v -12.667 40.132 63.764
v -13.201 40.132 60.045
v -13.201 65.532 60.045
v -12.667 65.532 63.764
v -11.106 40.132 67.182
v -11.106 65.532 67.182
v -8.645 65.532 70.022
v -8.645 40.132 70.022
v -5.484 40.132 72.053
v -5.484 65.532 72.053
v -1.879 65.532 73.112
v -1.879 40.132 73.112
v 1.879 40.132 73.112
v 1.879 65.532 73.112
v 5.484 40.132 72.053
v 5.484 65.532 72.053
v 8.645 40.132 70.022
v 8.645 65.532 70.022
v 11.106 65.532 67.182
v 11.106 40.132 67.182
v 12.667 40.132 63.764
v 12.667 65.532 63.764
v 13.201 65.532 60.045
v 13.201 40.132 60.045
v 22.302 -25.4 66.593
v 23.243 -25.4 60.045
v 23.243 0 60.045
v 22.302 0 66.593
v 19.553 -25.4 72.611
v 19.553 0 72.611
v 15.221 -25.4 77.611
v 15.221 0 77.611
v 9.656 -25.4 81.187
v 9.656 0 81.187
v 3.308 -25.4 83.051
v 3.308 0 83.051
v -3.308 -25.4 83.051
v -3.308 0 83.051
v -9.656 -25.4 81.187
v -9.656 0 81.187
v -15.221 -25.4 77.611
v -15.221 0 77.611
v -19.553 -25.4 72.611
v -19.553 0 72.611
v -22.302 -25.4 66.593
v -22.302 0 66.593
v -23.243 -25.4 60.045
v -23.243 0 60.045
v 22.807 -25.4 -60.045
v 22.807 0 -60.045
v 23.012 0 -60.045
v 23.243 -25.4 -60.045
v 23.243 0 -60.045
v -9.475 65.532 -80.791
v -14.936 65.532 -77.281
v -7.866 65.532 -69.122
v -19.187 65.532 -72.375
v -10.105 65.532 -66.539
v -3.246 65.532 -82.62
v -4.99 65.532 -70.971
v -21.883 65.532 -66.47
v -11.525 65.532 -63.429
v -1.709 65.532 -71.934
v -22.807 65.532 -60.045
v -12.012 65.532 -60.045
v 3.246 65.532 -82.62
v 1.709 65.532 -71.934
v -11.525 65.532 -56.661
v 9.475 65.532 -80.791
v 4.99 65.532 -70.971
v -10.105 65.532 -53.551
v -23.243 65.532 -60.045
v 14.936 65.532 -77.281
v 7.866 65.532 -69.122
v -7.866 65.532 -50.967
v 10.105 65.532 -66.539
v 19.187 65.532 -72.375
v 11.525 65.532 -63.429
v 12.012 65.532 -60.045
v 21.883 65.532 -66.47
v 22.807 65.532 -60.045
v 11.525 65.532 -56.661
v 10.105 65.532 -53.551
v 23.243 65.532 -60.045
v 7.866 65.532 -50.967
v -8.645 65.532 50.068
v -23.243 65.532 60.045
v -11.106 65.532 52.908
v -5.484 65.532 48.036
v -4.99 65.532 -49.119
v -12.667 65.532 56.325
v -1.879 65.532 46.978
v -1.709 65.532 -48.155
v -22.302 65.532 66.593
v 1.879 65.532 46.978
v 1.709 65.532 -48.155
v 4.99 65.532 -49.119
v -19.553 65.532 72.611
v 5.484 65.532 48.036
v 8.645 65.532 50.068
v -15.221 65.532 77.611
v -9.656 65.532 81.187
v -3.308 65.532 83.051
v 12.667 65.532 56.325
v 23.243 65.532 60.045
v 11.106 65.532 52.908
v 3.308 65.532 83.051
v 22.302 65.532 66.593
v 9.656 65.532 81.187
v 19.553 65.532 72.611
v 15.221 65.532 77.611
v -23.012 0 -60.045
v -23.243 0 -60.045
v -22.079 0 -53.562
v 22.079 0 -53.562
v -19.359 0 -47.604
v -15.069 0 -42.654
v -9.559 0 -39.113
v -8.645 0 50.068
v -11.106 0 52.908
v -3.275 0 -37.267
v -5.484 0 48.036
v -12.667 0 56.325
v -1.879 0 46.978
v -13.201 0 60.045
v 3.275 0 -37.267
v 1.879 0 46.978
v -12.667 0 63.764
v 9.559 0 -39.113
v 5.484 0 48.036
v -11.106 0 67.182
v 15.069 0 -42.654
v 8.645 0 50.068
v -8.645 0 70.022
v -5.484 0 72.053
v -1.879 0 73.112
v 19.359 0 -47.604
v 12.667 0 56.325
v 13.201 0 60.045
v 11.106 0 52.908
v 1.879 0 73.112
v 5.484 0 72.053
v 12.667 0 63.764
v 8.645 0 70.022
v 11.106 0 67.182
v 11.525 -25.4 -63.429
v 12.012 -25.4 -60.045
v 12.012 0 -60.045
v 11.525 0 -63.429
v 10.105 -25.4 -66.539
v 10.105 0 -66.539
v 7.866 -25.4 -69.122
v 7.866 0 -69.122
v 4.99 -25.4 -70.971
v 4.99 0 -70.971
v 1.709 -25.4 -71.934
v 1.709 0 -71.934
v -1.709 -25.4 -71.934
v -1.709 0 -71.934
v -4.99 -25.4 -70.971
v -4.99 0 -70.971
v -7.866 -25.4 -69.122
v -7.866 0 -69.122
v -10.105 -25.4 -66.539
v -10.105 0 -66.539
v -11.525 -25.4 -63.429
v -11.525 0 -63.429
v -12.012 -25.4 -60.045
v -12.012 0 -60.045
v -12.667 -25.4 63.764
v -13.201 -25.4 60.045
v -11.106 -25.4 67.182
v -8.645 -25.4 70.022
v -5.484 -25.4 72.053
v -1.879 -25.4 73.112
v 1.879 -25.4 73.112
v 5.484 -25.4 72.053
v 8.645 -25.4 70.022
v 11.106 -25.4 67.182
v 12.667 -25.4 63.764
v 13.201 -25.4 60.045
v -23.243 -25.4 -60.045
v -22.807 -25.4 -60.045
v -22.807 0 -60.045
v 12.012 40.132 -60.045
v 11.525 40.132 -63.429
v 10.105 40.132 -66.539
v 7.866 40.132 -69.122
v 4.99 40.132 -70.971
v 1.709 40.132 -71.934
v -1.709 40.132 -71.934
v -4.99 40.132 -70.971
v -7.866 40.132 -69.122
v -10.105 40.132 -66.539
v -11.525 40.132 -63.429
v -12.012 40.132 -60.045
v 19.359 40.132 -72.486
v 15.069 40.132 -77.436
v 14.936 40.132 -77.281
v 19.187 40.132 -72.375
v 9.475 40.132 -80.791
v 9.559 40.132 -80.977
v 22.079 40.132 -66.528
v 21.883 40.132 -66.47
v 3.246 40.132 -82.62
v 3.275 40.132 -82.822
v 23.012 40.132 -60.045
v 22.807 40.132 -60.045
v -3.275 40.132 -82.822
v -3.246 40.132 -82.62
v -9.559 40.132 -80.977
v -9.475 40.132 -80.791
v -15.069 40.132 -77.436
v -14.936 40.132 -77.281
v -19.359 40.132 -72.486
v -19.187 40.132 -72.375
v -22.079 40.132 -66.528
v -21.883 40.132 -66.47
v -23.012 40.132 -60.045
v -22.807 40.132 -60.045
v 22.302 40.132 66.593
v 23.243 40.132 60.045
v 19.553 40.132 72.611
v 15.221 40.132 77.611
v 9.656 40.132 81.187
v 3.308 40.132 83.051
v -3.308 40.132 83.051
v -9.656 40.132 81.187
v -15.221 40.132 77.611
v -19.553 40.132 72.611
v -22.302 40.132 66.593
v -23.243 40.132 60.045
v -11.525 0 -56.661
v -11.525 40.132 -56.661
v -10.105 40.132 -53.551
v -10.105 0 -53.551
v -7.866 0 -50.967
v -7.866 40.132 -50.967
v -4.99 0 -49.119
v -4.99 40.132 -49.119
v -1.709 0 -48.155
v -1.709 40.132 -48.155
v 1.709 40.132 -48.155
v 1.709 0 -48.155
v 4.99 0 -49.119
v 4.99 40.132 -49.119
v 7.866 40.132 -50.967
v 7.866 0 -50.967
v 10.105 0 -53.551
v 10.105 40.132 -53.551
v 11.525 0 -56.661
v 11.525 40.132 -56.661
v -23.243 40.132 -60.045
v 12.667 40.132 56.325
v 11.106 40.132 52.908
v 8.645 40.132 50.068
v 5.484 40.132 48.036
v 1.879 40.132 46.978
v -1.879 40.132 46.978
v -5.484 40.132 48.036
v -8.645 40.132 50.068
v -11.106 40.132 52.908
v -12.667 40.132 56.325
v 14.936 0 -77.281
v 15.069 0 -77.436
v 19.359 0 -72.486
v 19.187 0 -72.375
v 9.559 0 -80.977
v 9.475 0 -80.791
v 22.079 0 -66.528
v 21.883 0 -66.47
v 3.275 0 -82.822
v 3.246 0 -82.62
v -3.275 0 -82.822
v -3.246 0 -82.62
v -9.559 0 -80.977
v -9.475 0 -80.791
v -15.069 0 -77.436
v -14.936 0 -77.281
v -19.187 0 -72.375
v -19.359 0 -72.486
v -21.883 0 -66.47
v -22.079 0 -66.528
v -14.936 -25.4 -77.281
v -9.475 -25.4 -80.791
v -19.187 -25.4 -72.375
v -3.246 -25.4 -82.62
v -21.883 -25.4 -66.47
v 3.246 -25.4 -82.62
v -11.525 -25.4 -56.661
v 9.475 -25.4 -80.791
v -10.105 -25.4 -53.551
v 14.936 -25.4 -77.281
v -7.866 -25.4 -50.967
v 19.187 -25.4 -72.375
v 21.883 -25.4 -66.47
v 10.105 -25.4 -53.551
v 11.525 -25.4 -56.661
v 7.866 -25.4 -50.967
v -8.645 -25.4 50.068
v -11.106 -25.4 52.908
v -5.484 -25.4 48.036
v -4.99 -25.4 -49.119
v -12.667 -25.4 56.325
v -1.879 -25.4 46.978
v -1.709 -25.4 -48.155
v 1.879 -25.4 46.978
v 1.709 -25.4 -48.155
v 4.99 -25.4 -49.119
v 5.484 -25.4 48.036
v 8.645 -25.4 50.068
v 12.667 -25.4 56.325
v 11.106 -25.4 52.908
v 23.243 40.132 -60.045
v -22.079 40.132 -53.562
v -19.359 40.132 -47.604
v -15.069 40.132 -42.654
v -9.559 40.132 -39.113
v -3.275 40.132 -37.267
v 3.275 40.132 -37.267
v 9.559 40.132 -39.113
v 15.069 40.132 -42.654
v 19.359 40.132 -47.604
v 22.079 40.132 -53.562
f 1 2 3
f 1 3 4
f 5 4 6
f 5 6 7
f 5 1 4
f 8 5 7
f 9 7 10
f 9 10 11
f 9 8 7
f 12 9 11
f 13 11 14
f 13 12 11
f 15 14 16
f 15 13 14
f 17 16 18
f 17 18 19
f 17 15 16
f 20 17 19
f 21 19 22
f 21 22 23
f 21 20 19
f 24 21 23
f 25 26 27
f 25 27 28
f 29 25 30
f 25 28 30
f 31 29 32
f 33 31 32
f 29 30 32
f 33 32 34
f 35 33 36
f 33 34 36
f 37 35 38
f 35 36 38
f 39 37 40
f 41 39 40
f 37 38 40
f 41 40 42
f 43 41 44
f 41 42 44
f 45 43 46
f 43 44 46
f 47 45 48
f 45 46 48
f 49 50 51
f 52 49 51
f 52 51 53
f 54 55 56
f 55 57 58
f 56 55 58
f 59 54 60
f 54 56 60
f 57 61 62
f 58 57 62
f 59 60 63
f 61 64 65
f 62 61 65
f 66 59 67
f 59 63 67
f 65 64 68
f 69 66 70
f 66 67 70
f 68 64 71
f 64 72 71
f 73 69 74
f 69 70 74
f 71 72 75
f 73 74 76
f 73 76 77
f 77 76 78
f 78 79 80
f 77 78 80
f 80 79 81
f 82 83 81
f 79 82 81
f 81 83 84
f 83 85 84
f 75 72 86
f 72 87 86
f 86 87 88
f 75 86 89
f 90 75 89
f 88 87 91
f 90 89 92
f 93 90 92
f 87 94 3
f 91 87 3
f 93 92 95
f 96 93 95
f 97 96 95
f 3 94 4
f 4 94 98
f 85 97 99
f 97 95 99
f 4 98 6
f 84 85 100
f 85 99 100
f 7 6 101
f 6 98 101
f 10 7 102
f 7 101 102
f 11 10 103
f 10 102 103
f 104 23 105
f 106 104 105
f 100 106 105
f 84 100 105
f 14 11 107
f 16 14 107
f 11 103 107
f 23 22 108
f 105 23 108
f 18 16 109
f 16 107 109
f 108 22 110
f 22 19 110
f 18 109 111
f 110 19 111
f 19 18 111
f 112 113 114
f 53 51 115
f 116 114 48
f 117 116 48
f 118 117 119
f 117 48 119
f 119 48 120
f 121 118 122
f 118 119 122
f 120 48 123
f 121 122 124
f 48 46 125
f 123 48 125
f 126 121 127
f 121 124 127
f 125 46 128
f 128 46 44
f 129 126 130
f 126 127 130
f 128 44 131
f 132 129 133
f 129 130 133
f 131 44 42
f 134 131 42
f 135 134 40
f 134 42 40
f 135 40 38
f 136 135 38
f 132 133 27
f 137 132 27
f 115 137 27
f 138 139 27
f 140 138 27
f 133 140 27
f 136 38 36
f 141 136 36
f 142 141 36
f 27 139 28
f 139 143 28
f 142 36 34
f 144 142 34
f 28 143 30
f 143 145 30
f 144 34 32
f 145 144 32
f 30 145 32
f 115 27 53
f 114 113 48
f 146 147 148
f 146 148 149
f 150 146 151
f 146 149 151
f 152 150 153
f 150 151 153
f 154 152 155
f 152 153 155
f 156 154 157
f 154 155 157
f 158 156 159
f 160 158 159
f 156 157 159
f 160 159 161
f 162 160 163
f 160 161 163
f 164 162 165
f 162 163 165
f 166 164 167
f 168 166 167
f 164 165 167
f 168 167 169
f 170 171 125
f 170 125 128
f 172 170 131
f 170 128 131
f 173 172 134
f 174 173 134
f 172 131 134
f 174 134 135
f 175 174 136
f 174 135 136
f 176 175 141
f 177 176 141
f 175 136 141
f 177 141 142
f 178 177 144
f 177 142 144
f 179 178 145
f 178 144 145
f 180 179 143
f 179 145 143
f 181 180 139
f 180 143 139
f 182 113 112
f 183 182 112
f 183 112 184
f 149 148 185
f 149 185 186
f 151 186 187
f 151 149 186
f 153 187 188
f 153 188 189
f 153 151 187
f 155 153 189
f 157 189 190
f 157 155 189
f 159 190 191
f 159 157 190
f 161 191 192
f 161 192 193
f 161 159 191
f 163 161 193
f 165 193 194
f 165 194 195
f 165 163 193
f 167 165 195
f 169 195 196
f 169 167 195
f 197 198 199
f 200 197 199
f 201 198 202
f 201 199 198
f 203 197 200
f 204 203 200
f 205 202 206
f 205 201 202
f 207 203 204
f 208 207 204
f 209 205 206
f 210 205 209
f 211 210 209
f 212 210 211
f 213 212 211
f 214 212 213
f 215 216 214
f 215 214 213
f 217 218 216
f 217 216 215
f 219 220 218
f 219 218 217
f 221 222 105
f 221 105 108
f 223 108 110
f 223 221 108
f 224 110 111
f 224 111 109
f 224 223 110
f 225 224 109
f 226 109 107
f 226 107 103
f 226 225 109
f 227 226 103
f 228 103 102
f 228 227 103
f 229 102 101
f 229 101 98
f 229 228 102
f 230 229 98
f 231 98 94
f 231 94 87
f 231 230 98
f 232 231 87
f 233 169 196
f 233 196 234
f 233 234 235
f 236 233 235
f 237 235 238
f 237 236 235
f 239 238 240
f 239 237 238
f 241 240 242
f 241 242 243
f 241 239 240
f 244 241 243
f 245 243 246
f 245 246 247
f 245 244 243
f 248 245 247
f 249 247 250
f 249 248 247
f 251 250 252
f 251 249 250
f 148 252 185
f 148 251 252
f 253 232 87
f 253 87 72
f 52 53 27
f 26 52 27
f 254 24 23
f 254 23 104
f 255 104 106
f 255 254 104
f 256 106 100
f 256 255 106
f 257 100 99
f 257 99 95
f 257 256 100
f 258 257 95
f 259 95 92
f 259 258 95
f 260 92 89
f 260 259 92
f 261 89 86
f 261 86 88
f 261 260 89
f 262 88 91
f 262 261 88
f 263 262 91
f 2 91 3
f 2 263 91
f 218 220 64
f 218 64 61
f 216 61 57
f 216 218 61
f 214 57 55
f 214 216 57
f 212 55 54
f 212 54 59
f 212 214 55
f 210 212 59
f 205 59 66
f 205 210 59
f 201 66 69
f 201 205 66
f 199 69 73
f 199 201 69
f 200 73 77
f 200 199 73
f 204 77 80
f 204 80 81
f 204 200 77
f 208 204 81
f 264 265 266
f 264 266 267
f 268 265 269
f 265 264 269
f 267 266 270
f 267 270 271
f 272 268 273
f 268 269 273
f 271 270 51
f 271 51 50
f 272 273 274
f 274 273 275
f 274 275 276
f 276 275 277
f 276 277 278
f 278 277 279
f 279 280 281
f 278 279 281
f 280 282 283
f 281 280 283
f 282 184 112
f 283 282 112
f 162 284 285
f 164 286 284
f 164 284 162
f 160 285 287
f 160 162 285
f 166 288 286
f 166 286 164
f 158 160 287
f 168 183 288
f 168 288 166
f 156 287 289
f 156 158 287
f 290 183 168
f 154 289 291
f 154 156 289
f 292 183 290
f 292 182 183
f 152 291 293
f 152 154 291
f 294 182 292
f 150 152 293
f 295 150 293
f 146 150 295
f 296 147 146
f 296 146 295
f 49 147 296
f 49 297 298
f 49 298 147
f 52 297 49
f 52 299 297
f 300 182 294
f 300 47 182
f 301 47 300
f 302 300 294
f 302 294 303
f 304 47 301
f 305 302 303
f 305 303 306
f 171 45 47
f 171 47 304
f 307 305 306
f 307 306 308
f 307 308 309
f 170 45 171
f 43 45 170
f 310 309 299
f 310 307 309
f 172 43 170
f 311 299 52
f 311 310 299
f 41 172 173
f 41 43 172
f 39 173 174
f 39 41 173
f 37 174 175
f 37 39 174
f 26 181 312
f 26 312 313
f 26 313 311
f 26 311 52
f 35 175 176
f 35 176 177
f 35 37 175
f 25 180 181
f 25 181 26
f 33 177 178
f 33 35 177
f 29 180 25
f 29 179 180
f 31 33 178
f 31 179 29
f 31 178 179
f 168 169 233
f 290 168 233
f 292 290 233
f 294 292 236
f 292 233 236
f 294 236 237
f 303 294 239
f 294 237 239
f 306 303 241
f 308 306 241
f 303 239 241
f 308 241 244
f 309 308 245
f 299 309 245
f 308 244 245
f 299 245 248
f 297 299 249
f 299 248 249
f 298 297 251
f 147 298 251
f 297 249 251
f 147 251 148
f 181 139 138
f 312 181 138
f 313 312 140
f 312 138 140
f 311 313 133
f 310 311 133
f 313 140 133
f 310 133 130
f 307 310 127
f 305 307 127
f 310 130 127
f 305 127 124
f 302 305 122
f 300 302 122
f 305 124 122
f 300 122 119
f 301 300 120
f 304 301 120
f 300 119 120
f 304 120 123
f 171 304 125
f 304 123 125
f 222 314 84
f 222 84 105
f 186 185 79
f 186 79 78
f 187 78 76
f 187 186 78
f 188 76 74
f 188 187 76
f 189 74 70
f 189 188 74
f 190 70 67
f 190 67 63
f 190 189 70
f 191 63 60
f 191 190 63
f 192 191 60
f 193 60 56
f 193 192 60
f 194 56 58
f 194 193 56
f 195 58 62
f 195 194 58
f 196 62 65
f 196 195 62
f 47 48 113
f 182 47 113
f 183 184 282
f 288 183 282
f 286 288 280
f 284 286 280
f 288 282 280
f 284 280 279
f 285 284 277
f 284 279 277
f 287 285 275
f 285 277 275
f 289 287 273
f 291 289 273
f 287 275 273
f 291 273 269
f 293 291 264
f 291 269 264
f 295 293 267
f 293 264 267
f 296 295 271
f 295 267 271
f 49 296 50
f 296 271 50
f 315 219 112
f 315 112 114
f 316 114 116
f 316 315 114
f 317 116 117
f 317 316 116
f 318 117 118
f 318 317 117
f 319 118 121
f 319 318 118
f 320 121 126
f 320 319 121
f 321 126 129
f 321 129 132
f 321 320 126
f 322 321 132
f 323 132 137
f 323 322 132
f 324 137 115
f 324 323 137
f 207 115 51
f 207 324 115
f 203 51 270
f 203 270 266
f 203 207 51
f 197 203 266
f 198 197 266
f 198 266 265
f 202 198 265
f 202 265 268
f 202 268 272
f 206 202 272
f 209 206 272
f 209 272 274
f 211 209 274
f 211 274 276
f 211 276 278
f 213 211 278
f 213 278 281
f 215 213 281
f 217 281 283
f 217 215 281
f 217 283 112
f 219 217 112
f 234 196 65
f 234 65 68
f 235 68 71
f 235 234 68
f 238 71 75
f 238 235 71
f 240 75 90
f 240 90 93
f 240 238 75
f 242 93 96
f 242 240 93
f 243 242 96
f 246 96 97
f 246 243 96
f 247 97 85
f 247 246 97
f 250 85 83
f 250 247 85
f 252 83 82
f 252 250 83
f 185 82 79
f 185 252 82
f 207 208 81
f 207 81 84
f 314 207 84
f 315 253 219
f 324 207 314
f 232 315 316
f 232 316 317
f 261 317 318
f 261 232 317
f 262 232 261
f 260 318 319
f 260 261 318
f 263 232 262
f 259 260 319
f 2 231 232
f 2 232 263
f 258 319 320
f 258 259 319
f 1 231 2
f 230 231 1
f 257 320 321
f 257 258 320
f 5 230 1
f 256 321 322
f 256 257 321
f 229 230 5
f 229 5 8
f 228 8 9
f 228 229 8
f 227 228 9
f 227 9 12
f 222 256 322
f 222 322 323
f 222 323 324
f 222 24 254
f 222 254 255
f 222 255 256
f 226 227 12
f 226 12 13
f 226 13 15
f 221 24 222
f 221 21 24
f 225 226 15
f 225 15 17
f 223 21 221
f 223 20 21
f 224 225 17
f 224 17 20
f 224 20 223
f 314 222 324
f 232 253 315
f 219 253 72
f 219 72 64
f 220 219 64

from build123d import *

# Parameters (mm, degrees)
F1_DEPTH = 25.4
F2_R     = 23.0115173136
F3_DEPTH = 20.066
F5_DEPTH = 65.533


with BuildPart() as f1:
    # F0 (on Front) → F1 (new body)
    with BuildSketch(Plane.XZ):
        with BuildLine():
            Line((23.2431292534, -60.0447505713), (23.2431292534, 60.0447505713))
            ThreePointArc((23.2431292534, 60.0447505713), (0, 36.8016213179), (-23.2431292534, 60.0447505713))
            Line((-23.2431292534, 60.0447505713), (-23.2431292534, -60.0447505713))
            Line((-23.2431292534, -60.0447505713), (-22.8073433001, -60.0447505713))
            ThreePointArc((-22.8073433001, -60.0447505713), (0, -37.2374072712), (22.8073433001, -60.0447505713))
            Line((22.8073433001, -60.0447505713), (23.2431292534, -60.0447505713))
        make_face()
        with BuildLine():
            Line((23.2431292534, 60.0447505713), (13.2014414659, 60.0447505713))
            ThreePointArc((13.2014414659, 60.0447505713), (0, 46.8433091053), (-13.2014414659, 60.0447505713))
            Line((-13.2014414659, 60.0447505713), (-23.2431292534, 60.0447505713))
            ThreePointArc((-23.2431292534, 60.0447505713), (0, 36.8016213179), (23.2431292534, 60.0447505713))
        make_face()
        with BuildLine():
            Line((12.0115778455, -60.0447505713), (22.8073433001, -60.0447505713))
            ThreePointArc((22.8073433001, -60.0447505713), (0, -37.2374072712), (-22.8073433001, -60.0447505713))
            Line((-22.8073433001, -60.0447505713), (-12.0115778455, -60.0447505713))
            ThreePointArc((-12.0115778455, -60.0447505713), (0, -48.0331727257), (12.0115778455, -60.0447505713))
        make_face()
        with BuildLine():
            ThreePointArc((-22.8073433001, -60.0447505713), (0, -82.8520938713), (22.8073433001, -60.0447505713))
            Line((22.8073433001, -60.0447505713), (12.0115778455, -60.0447505713))
            ThreePointArc((12.0115778455, -60.0447505713), (0, -72.0563284168), (-12.0115778455, -60.0447505713))
            Line((-12.0115778455, -60.0447505713), (-22.8073433001, -60.0447505713))
        make_face()
        with BuildLine():
            ThreePointArc((-13.2014414659, 60.0447505713), (0, 73.2461920372), (13.2014414659, 60.0447505713))
            Line((13.2014414659, 60.0447505713), (23.2431292534, 60.0447505713))
            ThreePointArc((23.2431292534, 60.0447505713), (0, 83.2878798246), (-23.2431292534, 60.0447505713))
            Line((-23.2431292534, 60.0447505713), (-13.2014414659, 60.0447505713))
        make_face()
    extrude(amount=F1_DEPTH)

    # F2 (on face) → F3 (join)
    with BuildSketch(Plane(origin=(0, 0, 0), x_dir=(-1, 0, 0), z_dir=(0, 1, 0))):
        with Locations((0, -60.0447505713)):
            Circle(F2_R)
    extrude(amount=F3_DEPTH)

    # F4: F1 across face


with BuildPart() as f1_1:
    add(f1.part)
    add(f1.part.mirror(Plane(origin=(0, 20.066, -60.0447505713), x_dir=(-1, 0, 0), z_dir=(0, 1, 0))))

    # F5 (cut, through all): a face of the model
    f5_faces = [f1_1.faces().sort_by_distance(p)[0] for p in [
        (0, 0, -60.0447505713),
    ]]
    extrude(f5_faces, amount=-F5_DEPTH, mode=Mode.SUBTRACT)


solid = f1_1.part
